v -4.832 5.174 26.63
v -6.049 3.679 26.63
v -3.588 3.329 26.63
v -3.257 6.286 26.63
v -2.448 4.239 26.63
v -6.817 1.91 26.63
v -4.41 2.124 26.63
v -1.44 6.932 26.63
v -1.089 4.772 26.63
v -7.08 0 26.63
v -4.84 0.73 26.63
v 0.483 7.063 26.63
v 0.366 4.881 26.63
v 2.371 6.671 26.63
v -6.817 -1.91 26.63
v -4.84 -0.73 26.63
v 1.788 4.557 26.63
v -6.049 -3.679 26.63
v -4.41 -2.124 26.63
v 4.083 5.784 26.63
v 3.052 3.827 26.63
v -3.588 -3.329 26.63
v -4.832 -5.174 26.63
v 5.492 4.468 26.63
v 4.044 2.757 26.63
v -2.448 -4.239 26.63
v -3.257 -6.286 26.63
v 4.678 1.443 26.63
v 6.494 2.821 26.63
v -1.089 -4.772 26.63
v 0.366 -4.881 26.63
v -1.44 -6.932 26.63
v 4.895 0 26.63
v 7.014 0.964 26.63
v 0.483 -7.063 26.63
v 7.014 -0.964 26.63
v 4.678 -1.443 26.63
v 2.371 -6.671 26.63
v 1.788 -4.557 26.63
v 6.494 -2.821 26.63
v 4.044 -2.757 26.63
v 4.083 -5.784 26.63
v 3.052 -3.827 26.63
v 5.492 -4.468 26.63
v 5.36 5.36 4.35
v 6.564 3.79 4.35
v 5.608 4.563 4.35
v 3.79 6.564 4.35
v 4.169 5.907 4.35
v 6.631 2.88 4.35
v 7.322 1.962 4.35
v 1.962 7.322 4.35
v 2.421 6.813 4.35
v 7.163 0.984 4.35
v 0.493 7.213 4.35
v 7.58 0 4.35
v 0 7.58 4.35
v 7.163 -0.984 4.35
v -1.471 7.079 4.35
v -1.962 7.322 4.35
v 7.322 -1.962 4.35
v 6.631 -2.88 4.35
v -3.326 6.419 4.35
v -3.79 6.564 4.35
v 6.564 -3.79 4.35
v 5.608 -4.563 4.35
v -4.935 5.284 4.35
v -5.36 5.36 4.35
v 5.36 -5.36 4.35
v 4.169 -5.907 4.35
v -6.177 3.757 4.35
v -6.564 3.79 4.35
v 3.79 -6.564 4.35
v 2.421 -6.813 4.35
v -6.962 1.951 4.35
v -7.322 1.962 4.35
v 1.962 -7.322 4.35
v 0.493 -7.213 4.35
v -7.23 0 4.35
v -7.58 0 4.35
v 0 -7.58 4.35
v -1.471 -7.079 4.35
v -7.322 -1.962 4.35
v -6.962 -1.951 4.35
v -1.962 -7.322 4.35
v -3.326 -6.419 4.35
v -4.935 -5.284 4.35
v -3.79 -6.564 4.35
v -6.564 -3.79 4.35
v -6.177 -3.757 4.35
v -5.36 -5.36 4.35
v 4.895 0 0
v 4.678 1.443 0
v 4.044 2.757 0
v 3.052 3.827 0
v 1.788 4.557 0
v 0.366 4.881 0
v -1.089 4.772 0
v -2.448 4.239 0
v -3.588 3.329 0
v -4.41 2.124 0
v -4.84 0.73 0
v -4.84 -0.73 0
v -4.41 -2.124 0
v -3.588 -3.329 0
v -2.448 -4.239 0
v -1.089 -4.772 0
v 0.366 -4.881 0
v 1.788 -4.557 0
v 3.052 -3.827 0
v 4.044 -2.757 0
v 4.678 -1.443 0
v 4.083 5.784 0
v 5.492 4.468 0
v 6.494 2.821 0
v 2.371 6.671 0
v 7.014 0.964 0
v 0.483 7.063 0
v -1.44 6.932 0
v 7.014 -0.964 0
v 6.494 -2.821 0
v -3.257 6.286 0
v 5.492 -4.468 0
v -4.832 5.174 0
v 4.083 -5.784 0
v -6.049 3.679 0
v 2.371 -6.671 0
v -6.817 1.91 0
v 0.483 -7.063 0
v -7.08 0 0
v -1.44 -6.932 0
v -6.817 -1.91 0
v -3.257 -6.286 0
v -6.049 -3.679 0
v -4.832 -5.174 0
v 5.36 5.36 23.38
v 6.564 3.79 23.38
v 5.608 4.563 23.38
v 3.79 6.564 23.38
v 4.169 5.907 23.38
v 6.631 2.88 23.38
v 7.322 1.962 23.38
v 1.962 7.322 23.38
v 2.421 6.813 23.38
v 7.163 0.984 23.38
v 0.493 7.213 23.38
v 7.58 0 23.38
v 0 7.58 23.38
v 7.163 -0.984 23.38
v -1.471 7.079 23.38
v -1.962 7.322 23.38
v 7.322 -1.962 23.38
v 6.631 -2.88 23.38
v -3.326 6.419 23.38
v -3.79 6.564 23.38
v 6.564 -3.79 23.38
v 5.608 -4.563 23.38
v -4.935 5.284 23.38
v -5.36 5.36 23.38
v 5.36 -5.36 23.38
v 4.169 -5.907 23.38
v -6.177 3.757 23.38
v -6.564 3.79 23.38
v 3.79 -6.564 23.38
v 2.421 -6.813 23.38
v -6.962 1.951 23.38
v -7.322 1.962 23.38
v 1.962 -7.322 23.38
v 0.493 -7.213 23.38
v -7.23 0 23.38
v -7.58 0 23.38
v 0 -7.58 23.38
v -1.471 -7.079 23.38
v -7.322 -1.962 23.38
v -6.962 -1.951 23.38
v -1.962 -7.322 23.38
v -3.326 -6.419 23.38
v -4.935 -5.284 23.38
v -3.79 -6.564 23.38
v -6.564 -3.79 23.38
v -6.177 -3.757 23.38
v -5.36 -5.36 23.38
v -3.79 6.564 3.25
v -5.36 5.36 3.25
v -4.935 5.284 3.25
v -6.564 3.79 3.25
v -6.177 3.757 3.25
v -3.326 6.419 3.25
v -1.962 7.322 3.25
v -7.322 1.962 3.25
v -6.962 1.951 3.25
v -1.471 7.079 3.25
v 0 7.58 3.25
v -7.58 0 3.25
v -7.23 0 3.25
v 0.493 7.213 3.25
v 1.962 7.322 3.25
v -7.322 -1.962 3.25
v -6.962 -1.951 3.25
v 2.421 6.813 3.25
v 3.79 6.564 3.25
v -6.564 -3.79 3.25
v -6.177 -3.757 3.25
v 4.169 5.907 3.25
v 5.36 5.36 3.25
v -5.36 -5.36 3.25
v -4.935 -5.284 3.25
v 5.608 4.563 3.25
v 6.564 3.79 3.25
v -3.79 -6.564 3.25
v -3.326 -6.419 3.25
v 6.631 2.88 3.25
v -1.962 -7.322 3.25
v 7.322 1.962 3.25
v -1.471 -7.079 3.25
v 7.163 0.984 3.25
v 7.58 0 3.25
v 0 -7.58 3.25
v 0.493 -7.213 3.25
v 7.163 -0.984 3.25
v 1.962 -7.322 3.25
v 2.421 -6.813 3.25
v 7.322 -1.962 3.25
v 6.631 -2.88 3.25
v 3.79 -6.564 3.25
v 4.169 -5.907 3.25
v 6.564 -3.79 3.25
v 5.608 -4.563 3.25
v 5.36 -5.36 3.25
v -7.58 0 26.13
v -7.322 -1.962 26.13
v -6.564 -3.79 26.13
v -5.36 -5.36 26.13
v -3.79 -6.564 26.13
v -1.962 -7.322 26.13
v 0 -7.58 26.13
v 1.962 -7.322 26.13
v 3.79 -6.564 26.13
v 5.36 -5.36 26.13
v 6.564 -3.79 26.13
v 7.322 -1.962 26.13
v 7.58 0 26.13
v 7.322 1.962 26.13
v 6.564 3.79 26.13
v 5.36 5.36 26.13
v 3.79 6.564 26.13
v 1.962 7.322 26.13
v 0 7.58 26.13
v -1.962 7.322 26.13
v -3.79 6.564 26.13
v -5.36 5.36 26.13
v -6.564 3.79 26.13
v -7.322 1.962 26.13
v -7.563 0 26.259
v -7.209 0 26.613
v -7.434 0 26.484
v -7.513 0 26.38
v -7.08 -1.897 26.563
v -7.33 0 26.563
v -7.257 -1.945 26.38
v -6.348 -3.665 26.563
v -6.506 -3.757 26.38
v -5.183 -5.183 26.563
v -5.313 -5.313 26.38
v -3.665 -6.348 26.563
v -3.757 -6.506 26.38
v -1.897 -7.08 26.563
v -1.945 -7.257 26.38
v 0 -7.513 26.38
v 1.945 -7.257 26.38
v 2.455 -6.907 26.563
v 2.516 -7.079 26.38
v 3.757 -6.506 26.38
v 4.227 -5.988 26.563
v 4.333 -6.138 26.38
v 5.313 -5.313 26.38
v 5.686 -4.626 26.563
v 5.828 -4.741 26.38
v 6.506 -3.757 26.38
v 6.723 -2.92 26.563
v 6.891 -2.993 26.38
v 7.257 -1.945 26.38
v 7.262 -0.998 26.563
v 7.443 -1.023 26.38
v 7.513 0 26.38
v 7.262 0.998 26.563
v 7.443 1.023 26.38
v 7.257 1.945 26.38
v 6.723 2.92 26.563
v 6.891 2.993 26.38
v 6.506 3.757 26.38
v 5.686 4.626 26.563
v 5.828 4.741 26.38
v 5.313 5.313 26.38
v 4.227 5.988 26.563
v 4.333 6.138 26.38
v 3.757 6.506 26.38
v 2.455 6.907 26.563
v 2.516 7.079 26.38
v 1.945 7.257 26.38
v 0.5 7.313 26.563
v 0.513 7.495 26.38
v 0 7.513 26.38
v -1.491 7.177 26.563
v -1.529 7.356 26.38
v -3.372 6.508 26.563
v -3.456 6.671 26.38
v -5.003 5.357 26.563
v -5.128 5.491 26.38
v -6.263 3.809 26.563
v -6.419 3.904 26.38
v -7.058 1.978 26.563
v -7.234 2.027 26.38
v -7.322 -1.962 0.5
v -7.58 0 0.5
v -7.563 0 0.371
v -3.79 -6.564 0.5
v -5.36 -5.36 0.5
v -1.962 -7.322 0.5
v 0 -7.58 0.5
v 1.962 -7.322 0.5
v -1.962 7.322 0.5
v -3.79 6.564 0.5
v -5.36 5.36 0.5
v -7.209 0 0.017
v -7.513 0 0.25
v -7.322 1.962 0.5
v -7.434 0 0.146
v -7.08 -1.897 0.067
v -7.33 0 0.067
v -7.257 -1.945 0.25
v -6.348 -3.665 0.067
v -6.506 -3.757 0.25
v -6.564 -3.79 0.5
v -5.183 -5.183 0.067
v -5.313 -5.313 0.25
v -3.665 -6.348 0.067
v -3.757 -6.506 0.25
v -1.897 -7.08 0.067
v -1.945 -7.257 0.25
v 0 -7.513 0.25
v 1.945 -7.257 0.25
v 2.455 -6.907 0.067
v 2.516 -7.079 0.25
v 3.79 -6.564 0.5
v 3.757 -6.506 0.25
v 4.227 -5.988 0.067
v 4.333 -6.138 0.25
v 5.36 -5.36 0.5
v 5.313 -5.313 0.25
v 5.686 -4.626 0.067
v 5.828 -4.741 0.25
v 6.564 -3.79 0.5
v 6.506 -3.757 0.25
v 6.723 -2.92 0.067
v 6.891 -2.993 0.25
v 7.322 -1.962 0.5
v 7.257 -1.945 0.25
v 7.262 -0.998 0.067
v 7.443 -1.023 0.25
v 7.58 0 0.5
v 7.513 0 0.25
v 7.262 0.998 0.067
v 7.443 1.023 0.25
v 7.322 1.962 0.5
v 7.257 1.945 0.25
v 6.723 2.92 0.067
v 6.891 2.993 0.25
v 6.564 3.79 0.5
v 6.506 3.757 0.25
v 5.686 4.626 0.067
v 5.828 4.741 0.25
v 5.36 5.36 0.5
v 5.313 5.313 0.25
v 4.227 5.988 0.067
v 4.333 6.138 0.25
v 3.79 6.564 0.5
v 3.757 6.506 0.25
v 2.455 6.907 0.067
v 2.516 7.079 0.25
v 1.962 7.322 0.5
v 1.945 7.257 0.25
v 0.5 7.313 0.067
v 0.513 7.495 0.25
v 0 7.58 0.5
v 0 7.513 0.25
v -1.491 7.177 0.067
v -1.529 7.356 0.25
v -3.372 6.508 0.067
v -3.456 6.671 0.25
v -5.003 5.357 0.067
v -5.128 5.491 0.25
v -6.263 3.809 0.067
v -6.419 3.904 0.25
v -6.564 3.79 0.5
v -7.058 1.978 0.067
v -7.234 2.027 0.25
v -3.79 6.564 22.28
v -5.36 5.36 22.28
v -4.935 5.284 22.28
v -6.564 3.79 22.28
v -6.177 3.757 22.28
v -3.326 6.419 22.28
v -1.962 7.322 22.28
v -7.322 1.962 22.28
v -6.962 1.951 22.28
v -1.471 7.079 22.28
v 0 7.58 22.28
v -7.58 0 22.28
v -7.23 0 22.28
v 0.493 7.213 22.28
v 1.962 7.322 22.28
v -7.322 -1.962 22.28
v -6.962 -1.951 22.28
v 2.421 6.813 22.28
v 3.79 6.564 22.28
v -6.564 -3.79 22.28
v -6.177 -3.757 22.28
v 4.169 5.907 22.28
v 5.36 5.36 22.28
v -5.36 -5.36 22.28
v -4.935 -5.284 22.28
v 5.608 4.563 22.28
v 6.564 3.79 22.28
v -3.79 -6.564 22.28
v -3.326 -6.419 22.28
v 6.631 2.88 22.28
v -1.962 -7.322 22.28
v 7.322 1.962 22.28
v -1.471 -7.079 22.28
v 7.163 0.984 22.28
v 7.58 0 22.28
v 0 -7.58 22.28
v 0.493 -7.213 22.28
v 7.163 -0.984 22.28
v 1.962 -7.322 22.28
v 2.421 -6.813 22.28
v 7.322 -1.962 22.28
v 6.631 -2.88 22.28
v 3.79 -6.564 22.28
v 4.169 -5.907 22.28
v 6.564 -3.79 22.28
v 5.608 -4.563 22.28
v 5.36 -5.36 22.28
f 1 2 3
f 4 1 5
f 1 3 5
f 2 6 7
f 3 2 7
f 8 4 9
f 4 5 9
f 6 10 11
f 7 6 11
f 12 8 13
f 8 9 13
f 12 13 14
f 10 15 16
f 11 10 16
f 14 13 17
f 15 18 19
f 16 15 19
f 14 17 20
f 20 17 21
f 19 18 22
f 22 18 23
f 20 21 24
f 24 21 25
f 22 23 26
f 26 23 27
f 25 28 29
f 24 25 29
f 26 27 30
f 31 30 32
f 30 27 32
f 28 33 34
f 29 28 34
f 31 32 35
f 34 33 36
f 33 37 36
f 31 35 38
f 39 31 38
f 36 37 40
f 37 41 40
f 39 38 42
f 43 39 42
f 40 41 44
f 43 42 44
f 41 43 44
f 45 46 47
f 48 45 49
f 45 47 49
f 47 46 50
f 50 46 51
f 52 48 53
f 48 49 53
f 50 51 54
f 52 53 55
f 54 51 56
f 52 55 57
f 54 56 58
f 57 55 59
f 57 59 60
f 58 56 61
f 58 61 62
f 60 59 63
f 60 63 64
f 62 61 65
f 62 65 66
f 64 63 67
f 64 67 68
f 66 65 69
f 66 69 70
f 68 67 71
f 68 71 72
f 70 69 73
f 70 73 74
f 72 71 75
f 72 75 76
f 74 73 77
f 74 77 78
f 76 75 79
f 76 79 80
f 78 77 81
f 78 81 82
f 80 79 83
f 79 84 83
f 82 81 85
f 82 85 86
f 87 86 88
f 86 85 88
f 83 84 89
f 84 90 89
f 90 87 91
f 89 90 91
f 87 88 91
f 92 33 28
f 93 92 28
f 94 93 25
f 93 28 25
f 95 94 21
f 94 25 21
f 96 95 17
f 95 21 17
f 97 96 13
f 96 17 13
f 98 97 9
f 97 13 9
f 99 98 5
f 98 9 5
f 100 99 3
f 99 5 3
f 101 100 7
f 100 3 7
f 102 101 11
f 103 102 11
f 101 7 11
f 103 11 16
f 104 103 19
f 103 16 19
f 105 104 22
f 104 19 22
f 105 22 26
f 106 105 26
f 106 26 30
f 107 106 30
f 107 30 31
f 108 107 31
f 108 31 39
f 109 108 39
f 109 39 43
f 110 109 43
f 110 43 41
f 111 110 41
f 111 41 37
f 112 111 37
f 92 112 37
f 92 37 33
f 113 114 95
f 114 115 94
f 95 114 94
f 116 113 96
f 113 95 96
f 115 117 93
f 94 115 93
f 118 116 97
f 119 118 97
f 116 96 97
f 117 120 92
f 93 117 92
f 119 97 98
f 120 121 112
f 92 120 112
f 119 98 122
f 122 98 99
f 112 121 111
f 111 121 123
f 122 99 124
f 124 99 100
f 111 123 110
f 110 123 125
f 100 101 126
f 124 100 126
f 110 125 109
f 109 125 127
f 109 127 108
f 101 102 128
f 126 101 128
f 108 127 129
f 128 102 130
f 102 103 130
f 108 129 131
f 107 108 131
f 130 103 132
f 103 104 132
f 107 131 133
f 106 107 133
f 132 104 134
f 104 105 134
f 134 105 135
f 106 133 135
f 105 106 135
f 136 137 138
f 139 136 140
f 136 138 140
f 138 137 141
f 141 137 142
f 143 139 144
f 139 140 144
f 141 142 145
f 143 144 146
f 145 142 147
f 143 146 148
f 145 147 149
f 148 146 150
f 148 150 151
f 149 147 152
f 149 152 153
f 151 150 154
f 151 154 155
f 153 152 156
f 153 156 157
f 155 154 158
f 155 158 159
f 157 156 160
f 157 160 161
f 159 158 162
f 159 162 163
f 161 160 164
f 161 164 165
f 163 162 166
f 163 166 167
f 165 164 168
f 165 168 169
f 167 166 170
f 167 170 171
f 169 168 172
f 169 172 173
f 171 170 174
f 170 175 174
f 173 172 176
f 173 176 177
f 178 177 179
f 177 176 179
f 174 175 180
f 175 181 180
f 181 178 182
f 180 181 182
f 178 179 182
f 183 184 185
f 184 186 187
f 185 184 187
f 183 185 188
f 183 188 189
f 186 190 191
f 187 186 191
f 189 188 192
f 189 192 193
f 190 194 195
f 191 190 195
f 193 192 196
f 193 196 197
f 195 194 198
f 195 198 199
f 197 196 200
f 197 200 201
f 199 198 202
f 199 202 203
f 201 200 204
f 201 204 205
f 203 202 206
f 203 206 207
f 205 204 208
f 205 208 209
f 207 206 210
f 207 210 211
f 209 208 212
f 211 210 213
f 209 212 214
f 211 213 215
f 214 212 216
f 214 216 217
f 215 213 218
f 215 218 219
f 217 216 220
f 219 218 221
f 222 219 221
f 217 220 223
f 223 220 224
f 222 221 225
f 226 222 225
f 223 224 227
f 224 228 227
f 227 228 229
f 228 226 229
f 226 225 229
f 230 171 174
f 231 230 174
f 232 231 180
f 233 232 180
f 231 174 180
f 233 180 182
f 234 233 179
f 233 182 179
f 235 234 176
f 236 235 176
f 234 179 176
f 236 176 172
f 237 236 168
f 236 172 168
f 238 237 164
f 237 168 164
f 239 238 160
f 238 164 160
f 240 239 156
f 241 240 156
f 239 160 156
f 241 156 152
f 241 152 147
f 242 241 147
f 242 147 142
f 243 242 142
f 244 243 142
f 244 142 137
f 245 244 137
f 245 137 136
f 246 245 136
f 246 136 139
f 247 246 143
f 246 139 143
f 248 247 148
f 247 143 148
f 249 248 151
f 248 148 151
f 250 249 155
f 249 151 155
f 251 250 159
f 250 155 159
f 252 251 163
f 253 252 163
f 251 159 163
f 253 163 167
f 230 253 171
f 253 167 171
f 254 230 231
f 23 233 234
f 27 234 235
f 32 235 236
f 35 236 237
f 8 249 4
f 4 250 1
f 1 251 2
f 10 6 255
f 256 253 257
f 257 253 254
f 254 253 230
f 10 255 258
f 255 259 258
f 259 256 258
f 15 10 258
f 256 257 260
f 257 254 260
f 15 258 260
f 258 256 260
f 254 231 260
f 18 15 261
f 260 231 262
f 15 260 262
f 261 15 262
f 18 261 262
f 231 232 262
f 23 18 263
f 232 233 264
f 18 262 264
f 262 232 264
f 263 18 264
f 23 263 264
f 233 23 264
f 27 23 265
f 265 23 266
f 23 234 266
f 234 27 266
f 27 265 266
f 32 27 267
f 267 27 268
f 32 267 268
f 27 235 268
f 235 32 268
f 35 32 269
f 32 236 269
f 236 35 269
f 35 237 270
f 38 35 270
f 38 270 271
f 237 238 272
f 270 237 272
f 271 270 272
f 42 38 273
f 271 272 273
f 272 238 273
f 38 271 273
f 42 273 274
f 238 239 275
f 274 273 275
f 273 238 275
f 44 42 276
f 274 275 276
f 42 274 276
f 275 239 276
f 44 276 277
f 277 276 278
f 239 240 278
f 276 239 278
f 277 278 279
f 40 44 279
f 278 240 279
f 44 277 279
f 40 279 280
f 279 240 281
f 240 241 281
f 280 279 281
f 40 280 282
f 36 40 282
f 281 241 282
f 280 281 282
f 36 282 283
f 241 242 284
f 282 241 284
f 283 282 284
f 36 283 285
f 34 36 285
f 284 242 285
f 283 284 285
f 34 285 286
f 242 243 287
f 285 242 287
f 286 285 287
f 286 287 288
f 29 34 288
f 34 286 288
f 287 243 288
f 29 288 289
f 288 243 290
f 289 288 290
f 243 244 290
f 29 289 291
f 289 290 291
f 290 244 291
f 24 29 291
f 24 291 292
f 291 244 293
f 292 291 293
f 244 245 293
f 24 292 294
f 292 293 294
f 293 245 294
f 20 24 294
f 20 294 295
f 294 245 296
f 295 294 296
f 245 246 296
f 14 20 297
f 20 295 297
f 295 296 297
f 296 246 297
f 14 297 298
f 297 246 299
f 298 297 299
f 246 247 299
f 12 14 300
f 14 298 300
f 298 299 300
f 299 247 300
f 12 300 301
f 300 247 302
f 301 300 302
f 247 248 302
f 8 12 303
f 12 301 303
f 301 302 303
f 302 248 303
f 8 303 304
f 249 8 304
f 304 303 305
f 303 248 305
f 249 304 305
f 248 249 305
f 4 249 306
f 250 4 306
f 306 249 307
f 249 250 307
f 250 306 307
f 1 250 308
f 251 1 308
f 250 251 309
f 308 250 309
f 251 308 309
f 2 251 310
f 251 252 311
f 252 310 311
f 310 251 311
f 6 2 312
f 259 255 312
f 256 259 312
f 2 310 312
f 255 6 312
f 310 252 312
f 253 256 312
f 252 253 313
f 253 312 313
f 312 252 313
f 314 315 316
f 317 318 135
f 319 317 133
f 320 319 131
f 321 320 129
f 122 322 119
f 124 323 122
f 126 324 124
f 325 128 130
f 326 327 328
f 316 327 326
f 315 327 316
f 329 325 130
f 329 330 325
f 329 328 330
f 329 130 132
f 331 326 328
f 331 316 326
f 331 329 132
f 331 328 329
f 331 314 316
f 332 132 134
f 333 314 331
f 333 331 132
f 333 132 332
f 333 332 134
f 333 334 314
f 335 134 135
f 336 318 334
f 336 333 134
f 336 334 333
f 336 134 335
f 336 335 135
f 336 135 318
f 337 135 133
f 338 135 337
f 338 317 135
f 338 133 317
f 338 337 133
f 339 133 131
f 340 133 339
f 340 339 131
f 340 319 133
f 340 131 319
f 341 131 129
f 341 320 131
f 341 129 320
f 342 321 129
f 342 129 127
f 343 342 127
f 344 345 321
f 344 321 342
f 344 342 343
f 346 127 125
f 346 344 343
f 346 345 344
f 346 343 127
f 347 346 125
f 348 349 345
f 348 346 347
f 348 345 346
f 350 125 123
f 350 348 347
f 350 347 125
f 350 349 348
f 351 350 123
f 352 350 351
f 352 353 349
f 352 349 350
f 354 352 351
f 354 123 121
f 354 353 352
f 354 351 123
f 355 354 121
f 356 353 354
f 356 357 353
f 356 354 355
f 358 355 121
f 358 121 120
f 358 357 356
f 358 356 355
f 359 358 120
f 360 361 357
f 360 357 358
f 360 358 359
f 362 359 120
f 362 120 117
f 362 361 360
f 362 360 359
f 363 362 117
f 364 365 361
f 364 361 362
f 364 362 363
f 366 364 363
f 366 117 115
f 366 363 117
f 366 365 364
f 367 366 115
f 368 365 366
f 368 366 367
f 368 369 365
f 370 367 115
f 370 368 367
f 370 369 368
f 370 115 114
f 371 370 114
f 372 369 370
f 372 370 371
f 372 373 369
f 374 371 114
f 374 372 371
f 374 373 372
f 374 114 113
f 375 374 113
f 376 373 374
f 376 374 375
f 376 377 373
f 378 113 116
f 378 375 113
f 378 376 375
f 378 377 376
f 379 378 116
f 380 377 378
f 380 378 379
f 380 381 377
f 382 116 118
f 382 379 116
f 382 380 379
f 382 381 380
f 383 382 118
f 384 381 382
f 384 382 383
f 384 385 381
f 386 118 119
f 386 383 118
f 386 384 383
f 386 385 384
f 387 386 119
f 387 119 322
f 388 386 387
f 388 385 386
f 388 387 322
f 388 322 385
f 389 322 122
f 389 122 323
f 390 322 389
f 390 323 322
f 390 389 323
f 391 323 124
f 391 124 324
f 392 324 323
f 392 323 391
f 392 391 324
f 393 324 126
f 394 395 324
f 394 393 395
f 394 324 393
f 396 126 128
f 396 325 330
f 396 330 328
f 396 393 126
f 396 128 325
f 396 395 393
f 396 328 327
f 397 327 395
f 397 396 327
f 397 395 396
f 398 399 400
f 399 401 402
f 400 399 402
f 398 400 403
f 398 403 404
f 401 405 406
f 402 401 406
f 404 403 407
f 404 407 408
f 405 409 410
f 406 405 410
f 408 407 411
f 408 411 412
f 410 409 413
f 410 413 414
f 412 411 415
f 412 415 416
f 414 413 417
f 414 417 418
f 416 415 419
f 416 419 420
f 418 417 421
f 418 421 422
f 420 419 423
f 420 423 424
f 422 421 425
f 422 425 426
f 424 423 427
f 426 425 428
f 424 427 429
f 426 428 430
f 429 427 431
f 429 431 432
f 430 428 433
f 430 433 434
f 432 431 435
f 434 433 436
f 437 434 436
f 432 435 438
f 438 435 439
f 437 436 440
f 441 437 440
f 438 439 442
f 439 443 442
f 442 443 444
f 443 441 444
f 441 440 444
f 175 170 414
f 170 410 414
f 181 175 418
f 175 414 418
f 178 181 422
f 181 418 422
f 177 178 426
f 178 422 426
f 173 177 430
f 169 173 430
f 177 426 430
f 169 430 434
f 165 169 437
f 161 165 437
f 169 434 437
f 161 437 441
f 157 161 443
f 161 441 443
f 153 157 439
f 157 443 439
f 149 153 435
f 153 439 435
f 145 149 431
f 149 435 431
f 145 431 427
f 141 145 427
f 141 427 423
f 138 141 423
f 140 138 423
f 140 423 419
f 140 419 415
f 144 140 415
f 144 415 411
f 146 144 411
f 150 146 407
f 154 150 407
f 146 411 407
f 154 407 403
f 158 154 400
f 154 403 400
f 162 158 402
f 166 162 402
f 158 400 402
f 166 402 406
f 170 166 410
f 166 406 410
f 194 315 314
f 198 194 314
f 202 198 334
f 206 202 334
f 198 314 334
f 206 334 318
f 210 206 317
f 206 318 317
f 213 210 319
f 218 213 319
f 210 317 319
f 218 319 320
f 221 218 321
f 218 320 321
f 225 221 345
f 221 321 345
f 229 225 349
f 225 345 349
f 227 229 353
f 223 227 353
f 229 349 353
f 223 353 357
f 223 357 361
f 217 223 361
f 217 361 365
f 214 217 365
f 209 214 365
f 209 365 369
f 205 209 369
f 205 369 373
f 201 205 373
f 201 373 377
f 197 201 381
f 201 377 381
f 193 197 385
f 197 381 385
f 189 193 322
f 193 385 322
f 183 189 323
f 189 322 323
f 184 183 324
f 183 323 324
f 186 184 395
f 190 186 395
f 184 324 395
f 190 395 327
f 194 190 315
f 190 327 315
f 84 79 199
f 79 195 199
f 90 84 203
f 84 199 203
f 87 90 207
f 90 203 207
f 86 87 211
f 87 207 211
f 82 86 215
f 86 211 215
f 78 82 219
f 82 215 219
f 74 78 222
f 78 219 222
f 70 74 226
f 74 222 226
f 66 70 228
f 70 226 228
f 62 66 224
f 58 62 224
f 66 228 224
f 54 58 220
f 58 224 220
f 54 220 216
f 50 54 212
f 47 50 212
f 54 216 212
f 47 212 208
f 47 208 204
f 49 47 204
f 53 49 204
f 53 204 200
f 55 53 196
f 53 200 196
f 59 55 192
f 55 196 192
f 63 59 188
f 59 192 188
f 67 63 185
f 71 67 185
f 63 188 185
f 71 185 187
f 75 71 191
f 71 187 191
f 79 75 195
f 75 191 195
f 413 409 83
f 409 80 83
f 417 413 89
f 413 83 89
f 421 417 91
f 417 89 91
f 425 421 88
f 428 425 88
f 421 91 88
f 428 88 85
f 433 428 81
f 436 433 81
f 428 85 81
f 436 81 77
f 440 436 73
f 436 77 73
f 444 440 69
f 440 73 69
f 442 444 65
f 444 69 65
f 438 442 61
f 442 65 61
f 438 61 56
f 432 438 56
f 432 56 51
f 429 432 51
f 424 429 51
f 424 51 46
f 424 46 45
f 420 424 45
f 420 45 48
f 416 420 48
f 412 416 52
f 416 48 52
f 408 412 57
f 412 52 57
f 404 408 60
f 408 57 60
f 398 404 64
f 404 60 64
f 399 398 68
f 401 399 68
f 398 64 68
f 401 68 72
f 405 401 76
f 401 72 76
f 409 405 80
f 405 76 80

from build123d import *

# Parameters (mm, degrees)
F2_R     = 4.895
F3_DEPTH = 26.631
F4_R     = 0.5


with BuildPart() as f1:
    # F0 (on Front) → F1 (revolve)
    with BuildSketch(Plane.XZ):
        Polygon((-7.58, 0), (0, 0), (0, 26.63), (-7.58, 26.63), (-7.58, 23.38), (-7.23, 23.38), (-7.23, 22.28), (-7.58, 22.28), (-7.58, 4.35), (-7.23, 4.35), (-7.23, 3.25), (-7.58, 3.25), align=None)
    revolve(axis=Axis((0, 0, 13.315), (0, 0, 1)))

    # F2 (on face) → F3 (cut, through all)
    with BuildSketch(Plane.XY.offset(26.63)):
        Circle(F2_R)
    extrude(amount=-F3_DEPTH, mode=Mode.SUBTRACT)

    # F4
    f4_edges = [f1.edges().sort_by_distance(p)[0] for p in [
        (7.58, 0, 0),
        (7.58, 0, 26.63),
    ]]
    fillet(f4_edges, radius=F4_R)


solid = f1.part
